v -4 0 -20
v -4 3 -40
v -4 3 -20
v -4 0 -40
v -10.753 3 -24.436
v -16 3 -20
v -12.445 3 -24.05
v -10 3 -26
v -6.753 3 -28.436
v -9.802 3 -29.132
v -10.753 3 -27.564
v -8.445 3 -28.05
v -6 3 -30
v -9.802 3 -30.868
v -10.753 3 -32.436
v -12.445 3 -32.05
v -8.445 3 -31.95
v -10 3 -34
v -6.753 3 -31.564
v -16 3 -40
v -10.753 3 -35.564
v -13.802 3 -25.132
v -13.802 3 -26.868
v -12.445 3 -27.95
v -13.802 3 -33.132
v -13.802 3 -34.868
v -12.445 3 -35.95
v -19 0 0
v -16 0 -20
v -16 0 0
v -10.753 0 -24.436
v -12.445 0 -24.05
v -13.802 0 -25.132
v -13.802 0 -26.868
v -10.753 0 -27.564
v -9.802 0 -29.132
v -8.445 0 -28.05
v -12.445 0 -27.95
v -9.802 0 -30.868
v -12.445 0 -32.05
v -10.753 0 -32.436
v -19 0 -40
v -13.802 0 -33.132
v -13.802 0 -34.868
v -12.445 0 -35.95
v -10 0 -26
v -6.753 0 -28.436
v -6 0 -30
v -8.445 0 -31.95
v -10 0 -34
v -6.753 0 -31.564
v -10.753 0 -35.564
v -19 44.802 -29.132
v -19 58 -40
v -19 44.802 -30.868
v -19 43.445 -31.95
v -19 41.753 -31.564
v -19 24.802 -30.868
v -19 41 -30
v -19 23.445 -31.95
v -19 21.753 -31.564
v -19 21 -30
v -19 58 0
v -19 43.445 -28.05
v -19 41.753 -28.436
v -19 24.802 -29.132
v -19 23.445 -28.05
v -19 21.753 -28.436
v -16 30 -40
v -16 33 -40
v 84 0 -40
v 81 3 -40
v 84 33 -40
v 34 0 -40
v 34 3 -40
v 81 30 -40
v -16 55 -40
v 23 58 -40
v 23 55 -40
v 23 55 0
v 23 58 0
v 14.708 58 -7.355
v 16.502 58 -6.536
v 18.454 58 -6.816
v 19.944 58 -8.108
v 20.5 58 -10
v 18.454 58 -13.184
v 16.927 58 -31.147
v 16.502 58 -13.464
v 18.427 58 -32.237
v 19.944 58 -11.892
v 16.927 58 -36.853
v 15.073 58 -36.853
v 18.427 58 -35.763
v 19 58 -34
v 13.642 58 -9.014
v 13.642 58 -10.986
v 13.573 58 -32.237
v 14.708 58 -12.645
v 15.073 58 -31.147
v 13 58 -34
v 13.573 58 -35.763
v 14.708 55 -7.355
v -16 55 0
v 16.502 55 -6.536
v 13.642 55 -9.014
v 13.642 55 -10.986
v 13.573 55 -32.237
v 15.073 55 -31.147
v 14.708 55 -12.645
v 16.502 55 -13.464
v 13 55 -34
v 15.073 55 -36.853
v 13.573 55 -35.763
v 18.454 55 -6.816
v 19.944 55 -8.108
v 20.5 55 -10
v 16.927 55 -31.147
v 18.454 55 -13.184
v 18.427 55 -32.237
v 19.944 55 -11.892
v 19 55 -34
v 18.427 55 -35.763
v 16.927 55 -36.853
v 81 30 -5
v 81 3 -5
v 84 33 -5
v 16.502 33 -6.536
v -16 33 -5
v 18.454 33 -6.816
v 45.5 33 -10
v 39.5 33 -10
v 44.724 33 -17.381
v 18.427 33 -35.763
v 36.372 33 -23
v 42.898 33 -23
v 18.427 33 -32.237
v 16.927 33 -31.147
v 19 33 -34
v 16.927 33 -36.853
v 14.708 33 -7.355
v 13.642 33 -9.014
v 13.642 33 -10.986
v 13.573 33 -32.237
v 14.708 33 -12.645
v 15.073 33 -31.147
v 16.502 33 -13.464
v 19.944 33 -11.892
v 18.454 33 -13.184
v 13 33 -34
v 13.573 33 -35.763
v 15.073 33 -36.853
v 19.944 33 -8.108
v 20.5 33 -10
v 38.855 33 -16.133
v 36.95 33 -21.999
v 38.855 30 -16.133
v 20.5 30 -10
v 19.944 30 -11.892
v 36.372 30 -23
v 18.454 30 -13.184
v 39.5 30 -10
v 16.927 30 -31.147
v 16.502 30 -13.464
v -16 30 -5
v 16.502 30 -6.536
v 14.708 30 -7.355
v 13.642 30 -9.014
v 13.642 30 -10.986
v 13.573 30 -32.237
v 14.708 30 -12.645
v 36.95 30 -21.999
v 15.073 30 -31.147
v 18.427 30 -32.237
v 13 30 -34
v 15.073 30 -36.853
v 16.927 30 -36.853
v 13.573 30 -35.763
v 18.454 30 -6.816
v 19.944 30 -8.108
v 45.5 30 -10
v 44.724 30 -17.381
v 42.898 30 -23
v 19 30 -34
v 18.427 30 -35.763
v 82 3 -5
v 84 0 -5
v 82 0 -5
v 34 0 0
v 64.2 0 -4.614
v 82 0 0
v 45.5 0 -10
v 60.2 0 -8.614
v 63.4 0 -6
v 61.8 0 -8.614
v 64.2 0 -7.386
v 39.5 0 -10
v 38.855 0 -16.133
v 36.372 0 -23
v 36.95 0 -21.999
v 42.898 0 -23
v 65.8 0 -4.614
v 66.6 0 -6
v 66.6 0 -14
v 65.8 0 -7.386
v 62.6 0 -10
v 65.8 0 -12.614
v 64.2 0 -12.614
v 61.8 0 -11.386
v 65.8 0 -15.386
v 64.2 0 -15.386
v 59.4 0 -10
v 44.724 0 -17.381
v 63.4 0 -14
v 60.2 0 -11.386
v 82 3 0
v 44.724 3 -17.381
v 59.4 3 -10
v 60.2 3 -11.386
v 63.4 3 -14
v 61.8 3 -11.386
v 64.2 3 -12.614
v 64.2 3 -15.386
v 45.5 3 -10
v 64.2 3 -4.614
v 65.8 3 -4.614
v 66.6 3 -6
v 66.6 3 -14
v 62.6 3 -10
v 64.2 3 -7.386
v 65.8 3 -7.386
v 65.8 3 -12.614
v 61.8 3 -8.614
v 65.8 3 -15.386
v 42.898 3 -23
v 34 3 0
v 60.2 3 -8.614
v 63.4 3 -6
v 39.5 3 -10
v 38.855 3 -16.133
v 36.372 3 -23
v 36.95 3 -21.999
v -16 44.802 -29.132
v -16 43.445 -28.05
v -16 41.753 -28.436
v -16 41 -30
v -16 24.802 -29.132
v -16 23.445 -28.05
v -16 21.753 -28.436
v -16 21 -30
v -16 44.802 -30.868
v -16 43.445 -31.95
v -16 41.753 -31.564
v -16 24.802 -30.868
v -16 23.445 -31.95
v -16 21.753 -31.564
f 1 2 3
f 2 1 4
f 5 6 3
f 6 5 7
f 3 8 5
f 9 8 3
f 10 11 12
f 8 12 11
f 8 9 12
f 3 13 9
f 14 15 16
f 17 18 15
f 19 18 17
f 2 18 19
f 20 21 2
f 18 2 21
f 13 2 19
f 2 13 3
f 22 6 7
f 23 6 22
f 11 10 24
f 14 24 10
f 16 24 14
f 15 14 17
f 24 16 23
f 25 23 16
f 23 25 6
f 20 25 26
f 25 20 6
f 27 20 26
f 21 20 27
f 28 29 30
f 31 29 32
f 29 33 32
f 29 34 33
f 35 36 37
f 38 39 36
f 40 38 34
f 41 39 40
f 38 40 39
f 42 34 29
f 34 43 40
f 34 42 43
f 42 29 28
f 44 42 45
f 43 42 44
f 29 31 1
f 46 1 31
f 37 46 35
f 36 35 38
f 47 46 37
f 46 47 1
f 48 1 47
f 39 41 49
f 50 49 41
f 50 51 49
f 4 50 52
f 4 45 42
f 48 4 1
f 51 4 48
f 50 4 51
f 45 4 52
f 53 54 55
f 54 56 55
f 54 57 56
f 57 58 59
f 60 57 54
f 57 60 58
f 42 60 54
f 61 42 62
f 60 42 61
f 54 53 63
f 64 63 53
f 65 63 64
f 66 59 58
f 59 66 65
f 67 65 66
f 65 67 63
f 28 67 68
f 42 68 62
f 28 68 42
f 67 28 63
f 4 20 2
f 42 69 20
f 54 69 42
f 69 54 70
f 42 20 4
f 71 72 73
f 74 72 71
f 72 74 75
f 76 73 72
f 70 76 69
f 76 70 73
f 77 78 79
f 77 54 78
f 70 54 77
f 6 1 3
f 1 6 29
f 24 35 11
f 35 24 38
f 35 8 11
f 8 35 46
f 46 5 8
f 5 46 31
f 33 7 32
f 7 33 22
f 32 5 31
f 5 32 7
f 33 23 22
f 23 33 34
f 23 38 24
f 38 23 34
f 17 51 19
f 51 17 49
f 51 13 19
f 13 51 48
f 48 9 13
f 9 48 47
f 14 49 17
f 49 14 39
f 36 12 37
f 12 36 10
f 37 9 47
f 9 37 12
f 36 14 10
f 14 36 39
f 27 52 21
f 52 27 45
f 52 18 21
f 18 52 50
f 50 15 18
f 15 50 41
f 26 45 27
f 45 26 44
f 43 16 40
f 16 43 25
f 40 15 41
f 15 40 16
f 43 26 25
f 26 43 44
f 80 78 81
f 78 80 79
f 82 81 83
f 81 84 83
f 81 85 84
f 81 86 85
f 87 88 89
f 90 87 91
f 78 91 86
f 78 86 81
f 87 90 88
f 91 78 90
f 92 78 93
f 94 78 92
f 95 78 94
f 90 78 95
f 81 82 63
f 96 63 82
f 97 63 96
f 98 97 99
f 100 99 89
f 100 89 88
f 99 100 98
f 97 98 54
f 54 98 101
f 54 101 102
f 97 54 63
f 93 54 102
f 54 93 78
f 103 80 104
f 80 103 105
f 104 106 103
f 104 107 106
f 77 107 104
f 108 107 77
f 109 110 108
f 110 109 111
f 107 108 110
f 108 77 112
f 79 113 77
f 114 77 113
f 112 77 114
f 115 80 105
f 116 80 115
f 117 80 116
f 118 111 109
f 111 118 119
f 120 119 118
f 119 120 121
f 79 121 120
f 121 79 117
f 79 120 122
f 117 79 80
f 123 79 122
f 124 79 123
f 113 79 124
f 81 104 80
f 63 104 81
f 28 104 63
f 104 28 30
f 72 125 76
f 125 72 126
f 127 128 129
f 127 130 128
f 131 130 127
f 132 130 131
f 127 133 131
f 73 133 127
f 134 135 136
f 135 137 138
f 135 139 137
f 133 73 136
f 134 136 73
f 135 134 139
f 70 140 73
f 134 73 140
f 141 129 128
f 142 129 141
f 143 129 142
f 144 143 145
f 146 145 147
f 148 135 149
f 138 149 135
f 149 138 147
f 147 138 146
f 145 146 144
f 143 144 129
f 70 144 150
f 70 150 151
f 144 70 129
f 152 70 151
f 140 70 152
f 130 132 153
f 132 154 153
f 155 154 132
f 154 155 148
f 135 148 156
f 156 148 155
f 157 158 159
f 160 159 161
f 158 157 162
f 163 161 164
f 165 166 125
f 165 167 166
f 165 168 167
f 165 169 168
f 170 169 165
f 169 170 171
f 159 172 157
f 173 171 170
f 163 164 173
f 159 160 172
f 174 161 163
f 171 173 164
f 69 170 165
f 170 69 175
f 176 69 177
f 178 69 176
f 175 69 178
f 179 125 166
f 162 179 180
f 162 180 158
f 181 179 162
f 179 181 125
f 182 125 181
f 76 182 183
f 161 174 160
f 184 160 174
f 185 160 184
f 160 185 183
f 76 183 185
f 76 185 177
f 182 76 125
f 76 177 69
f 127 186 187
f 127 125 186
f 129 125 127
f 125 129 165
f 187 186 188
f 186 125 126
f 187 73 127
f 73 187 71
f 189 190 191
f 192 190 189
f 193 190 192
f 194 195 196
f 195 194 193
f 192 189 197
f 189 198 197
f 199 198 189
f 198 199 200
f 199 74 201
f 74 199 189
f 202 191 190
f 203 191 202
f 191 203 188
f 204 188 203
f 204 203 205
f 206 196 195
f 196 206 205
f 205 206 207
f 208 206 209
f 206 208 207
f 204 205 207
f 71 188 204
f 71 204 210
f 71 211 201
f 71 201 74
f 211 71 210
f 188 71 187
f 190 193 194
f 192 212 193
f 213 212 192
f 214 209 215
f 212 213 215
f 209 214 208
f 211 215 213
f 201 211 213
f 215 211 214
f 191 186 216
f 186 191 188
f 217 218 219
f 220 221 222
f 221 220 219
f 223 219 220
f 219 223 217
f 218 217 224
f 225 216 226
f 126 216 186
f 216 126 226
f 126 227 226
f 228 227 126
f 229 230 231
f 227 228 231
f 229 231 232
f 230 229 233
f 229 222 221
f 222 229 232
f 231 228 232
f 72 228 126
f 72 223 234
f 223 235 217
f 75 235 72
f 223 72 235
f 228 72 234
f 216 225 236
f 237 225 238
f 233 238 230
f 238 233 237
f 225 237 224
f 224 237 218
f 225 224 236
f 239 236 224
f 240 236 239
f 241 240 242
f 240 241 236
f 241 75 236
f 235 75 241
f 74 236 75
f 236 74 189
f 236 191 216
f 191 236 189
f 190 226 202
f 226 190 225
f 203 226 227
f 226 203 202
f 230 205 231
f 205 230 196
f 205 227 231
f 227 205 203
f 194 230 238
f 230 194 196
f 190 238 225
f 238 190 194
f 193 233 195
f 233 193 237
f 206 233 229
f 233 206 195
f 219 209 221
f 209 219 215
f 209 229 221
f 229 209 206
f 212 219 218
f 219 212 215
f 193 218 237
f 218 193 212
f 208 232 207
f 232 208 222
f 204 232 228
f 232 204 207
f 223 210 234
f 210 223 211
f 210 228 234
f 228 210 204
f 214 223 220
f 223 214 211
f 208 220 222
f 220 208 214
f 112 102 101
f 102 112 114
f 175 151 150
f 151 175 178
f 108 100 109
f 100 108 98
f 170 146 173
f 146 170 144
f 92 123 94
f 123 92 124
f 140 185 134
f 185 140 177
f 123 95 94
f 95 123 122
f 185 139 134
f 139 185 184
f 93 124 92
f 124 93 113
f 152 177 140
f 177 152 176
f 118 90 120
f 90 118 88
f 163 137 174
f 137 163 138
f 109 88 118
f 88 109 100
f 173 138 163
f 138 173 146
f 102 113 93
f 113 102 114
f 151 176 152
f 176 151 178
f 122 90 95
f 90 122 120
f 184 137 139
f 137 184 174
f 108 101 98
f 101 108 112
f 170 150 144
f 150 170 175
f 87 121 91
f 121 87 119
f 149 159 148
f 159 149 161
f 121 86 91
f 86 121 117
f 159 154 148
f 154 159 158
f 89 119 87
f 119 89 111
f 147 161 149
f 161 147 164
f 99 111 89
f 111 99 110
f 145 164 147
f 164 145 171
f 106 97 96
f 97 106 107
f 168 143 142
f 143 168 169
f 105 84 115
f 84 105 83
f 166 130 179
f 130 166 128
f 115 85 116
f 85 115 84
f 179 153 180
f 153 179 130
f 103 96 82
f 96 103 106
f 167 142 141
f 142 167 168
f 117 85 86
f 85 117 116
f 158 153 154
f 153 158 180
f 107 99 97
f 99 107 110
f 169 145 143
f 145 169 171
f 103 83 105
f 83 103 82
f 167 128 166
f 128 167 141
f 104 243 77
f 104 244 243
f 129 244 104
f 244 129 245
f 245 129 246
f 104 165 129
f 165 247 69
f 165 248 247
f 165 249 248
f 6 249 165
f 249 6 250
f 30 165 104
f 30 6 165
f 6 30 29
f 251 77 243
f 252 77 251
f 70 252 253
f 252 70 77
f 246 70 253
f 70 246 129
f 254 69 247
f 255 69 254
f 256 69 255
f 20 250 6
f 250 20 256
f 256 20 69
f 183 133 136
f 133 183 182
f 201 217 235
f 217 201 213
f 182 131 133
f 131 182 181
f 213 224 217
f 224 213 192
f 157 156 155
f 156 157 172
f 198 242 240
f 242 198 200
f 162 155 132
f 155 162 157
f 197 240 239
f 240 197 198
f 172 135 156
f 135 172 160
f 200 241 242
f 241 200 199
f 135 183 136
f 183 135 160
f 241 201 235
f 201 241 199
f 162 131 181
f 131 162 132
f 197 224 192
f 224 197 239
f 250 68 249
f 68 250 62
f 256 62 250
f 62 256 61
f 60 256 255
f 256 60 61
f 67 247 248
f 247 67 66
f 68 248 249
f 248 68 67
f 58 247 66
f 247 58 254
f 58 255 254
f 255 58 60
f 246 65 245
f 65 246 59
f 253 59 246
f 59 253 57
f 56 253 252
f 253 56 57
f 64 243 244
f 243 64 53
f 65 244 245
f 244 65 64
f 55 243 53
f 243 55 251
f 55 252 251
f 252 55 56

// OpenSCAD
//rotate([0,-90,0]) 
// difference() {
//  union(){
//    bracket();
//    //translate([0,20,0]) cube([20,20,3]);
//    
//    translate([0,20,-15]) cube([3,20,45]);
//    
//  }
//  rotate([0,90,0]) translate([-18,34,0])  cylinder(20,d=4.8);
//  translate([-18,0,0]) cylinder(20,d=2);
//  rotate([0,90,0]) translate([12,26,0]) cylinder(20,d=2);
//  rotate([0,90,0]) translate([8,30,0]) cylinder(20,d=2);
//  color([1,0,0])rotate([0,90,0]) translate([12,34,-5]) cylinder(20,d=2);
// }

module bracket() {
    difference() {
        translate([0,0,5])cube([3,20,48]);
        translate([-1,10,18]) rotate([0,90,0]) cylinder(5,d1=15,d2=15); 
    }
    header();
    translate([0,0,50.5])header();
}     
module header() {
    difference() {
        cube([10,20,8]);
    
//        translate([-5,5,3.5]) rotate([0,90,0]) cylinder(20,d1=4,d2=4, true);
//        translate([-5,15,3.5]) rotate([0,90,0]) cylinder(20,d1=4,d2=4, true);
        translate([10,10,-1])cylinder(10,d=4);
    }  
    
    
}
module axlebrace() {
    difference() {
      union() {
          translate([0,-20,0]) cube([3,40,55]);
        difference() {
          cube([15,20,3]);
            
          //bottom mounting point
          rotate([0,0,0]) translate([7,6,0]) cylinder(20,d=4);
          rotate([0,0,0]) translate([11,10,0]) cylinder(20,d=4);
          rotate([0,0,0]) translate([7,14,0]) cylinder(20,d=4);
        }
        difference() {
          //big bracket
          union() {
            translate([0,-20,55]) cube([42,40,3]);
            translate([0,-15,30])cube([100,35,3]);
              //Overhang
            translate([100,-15,0])cube([3,35,33]);
            translate([53,-20,0])cube([48,40,3]);

          }
          //Top Mounting Point
          translate([84,-14,-5]) rotate([0,0,0])  cylinder(20,d=3.2);
          translate([80,-10,-5]) rotate([0,0,0]) cylinder(20,d=3.2);   
          translate([84,-6,-5]) rotate([0,0,0])  cylinder(20,d=3.2);
          //axle holes
          translate([35,14,1])cylinder(60,d=6);
          translate([36,-10,1])cylinder(60,d=7);
        }

      }
      //Arc
      translate([29,-10,-1]) intersection() {
         translate([23,0,-6])cube([85,13,40]);
        difference() {
          cylinder(50,r=35.5,true);
          cylinder(50,r=29.5,true);
        }
      }
    }
}
//translate([-18,10,-3]) rotate([0,0,90]) cylinder(2,d=12);
//translate([-18,26,-3]) rotate([0,0,90]) cylinder(2,d=20);
 rotate([-90,0,0])translate([-19,20,0]) difference() {
    axlebrace();
    rotate([0,90,0])translate([-23,10,-3])cylinder(10,d=4);
    rotate([0,90,0])translate([-43,10,-3])cylinder(10,d=4);
}
